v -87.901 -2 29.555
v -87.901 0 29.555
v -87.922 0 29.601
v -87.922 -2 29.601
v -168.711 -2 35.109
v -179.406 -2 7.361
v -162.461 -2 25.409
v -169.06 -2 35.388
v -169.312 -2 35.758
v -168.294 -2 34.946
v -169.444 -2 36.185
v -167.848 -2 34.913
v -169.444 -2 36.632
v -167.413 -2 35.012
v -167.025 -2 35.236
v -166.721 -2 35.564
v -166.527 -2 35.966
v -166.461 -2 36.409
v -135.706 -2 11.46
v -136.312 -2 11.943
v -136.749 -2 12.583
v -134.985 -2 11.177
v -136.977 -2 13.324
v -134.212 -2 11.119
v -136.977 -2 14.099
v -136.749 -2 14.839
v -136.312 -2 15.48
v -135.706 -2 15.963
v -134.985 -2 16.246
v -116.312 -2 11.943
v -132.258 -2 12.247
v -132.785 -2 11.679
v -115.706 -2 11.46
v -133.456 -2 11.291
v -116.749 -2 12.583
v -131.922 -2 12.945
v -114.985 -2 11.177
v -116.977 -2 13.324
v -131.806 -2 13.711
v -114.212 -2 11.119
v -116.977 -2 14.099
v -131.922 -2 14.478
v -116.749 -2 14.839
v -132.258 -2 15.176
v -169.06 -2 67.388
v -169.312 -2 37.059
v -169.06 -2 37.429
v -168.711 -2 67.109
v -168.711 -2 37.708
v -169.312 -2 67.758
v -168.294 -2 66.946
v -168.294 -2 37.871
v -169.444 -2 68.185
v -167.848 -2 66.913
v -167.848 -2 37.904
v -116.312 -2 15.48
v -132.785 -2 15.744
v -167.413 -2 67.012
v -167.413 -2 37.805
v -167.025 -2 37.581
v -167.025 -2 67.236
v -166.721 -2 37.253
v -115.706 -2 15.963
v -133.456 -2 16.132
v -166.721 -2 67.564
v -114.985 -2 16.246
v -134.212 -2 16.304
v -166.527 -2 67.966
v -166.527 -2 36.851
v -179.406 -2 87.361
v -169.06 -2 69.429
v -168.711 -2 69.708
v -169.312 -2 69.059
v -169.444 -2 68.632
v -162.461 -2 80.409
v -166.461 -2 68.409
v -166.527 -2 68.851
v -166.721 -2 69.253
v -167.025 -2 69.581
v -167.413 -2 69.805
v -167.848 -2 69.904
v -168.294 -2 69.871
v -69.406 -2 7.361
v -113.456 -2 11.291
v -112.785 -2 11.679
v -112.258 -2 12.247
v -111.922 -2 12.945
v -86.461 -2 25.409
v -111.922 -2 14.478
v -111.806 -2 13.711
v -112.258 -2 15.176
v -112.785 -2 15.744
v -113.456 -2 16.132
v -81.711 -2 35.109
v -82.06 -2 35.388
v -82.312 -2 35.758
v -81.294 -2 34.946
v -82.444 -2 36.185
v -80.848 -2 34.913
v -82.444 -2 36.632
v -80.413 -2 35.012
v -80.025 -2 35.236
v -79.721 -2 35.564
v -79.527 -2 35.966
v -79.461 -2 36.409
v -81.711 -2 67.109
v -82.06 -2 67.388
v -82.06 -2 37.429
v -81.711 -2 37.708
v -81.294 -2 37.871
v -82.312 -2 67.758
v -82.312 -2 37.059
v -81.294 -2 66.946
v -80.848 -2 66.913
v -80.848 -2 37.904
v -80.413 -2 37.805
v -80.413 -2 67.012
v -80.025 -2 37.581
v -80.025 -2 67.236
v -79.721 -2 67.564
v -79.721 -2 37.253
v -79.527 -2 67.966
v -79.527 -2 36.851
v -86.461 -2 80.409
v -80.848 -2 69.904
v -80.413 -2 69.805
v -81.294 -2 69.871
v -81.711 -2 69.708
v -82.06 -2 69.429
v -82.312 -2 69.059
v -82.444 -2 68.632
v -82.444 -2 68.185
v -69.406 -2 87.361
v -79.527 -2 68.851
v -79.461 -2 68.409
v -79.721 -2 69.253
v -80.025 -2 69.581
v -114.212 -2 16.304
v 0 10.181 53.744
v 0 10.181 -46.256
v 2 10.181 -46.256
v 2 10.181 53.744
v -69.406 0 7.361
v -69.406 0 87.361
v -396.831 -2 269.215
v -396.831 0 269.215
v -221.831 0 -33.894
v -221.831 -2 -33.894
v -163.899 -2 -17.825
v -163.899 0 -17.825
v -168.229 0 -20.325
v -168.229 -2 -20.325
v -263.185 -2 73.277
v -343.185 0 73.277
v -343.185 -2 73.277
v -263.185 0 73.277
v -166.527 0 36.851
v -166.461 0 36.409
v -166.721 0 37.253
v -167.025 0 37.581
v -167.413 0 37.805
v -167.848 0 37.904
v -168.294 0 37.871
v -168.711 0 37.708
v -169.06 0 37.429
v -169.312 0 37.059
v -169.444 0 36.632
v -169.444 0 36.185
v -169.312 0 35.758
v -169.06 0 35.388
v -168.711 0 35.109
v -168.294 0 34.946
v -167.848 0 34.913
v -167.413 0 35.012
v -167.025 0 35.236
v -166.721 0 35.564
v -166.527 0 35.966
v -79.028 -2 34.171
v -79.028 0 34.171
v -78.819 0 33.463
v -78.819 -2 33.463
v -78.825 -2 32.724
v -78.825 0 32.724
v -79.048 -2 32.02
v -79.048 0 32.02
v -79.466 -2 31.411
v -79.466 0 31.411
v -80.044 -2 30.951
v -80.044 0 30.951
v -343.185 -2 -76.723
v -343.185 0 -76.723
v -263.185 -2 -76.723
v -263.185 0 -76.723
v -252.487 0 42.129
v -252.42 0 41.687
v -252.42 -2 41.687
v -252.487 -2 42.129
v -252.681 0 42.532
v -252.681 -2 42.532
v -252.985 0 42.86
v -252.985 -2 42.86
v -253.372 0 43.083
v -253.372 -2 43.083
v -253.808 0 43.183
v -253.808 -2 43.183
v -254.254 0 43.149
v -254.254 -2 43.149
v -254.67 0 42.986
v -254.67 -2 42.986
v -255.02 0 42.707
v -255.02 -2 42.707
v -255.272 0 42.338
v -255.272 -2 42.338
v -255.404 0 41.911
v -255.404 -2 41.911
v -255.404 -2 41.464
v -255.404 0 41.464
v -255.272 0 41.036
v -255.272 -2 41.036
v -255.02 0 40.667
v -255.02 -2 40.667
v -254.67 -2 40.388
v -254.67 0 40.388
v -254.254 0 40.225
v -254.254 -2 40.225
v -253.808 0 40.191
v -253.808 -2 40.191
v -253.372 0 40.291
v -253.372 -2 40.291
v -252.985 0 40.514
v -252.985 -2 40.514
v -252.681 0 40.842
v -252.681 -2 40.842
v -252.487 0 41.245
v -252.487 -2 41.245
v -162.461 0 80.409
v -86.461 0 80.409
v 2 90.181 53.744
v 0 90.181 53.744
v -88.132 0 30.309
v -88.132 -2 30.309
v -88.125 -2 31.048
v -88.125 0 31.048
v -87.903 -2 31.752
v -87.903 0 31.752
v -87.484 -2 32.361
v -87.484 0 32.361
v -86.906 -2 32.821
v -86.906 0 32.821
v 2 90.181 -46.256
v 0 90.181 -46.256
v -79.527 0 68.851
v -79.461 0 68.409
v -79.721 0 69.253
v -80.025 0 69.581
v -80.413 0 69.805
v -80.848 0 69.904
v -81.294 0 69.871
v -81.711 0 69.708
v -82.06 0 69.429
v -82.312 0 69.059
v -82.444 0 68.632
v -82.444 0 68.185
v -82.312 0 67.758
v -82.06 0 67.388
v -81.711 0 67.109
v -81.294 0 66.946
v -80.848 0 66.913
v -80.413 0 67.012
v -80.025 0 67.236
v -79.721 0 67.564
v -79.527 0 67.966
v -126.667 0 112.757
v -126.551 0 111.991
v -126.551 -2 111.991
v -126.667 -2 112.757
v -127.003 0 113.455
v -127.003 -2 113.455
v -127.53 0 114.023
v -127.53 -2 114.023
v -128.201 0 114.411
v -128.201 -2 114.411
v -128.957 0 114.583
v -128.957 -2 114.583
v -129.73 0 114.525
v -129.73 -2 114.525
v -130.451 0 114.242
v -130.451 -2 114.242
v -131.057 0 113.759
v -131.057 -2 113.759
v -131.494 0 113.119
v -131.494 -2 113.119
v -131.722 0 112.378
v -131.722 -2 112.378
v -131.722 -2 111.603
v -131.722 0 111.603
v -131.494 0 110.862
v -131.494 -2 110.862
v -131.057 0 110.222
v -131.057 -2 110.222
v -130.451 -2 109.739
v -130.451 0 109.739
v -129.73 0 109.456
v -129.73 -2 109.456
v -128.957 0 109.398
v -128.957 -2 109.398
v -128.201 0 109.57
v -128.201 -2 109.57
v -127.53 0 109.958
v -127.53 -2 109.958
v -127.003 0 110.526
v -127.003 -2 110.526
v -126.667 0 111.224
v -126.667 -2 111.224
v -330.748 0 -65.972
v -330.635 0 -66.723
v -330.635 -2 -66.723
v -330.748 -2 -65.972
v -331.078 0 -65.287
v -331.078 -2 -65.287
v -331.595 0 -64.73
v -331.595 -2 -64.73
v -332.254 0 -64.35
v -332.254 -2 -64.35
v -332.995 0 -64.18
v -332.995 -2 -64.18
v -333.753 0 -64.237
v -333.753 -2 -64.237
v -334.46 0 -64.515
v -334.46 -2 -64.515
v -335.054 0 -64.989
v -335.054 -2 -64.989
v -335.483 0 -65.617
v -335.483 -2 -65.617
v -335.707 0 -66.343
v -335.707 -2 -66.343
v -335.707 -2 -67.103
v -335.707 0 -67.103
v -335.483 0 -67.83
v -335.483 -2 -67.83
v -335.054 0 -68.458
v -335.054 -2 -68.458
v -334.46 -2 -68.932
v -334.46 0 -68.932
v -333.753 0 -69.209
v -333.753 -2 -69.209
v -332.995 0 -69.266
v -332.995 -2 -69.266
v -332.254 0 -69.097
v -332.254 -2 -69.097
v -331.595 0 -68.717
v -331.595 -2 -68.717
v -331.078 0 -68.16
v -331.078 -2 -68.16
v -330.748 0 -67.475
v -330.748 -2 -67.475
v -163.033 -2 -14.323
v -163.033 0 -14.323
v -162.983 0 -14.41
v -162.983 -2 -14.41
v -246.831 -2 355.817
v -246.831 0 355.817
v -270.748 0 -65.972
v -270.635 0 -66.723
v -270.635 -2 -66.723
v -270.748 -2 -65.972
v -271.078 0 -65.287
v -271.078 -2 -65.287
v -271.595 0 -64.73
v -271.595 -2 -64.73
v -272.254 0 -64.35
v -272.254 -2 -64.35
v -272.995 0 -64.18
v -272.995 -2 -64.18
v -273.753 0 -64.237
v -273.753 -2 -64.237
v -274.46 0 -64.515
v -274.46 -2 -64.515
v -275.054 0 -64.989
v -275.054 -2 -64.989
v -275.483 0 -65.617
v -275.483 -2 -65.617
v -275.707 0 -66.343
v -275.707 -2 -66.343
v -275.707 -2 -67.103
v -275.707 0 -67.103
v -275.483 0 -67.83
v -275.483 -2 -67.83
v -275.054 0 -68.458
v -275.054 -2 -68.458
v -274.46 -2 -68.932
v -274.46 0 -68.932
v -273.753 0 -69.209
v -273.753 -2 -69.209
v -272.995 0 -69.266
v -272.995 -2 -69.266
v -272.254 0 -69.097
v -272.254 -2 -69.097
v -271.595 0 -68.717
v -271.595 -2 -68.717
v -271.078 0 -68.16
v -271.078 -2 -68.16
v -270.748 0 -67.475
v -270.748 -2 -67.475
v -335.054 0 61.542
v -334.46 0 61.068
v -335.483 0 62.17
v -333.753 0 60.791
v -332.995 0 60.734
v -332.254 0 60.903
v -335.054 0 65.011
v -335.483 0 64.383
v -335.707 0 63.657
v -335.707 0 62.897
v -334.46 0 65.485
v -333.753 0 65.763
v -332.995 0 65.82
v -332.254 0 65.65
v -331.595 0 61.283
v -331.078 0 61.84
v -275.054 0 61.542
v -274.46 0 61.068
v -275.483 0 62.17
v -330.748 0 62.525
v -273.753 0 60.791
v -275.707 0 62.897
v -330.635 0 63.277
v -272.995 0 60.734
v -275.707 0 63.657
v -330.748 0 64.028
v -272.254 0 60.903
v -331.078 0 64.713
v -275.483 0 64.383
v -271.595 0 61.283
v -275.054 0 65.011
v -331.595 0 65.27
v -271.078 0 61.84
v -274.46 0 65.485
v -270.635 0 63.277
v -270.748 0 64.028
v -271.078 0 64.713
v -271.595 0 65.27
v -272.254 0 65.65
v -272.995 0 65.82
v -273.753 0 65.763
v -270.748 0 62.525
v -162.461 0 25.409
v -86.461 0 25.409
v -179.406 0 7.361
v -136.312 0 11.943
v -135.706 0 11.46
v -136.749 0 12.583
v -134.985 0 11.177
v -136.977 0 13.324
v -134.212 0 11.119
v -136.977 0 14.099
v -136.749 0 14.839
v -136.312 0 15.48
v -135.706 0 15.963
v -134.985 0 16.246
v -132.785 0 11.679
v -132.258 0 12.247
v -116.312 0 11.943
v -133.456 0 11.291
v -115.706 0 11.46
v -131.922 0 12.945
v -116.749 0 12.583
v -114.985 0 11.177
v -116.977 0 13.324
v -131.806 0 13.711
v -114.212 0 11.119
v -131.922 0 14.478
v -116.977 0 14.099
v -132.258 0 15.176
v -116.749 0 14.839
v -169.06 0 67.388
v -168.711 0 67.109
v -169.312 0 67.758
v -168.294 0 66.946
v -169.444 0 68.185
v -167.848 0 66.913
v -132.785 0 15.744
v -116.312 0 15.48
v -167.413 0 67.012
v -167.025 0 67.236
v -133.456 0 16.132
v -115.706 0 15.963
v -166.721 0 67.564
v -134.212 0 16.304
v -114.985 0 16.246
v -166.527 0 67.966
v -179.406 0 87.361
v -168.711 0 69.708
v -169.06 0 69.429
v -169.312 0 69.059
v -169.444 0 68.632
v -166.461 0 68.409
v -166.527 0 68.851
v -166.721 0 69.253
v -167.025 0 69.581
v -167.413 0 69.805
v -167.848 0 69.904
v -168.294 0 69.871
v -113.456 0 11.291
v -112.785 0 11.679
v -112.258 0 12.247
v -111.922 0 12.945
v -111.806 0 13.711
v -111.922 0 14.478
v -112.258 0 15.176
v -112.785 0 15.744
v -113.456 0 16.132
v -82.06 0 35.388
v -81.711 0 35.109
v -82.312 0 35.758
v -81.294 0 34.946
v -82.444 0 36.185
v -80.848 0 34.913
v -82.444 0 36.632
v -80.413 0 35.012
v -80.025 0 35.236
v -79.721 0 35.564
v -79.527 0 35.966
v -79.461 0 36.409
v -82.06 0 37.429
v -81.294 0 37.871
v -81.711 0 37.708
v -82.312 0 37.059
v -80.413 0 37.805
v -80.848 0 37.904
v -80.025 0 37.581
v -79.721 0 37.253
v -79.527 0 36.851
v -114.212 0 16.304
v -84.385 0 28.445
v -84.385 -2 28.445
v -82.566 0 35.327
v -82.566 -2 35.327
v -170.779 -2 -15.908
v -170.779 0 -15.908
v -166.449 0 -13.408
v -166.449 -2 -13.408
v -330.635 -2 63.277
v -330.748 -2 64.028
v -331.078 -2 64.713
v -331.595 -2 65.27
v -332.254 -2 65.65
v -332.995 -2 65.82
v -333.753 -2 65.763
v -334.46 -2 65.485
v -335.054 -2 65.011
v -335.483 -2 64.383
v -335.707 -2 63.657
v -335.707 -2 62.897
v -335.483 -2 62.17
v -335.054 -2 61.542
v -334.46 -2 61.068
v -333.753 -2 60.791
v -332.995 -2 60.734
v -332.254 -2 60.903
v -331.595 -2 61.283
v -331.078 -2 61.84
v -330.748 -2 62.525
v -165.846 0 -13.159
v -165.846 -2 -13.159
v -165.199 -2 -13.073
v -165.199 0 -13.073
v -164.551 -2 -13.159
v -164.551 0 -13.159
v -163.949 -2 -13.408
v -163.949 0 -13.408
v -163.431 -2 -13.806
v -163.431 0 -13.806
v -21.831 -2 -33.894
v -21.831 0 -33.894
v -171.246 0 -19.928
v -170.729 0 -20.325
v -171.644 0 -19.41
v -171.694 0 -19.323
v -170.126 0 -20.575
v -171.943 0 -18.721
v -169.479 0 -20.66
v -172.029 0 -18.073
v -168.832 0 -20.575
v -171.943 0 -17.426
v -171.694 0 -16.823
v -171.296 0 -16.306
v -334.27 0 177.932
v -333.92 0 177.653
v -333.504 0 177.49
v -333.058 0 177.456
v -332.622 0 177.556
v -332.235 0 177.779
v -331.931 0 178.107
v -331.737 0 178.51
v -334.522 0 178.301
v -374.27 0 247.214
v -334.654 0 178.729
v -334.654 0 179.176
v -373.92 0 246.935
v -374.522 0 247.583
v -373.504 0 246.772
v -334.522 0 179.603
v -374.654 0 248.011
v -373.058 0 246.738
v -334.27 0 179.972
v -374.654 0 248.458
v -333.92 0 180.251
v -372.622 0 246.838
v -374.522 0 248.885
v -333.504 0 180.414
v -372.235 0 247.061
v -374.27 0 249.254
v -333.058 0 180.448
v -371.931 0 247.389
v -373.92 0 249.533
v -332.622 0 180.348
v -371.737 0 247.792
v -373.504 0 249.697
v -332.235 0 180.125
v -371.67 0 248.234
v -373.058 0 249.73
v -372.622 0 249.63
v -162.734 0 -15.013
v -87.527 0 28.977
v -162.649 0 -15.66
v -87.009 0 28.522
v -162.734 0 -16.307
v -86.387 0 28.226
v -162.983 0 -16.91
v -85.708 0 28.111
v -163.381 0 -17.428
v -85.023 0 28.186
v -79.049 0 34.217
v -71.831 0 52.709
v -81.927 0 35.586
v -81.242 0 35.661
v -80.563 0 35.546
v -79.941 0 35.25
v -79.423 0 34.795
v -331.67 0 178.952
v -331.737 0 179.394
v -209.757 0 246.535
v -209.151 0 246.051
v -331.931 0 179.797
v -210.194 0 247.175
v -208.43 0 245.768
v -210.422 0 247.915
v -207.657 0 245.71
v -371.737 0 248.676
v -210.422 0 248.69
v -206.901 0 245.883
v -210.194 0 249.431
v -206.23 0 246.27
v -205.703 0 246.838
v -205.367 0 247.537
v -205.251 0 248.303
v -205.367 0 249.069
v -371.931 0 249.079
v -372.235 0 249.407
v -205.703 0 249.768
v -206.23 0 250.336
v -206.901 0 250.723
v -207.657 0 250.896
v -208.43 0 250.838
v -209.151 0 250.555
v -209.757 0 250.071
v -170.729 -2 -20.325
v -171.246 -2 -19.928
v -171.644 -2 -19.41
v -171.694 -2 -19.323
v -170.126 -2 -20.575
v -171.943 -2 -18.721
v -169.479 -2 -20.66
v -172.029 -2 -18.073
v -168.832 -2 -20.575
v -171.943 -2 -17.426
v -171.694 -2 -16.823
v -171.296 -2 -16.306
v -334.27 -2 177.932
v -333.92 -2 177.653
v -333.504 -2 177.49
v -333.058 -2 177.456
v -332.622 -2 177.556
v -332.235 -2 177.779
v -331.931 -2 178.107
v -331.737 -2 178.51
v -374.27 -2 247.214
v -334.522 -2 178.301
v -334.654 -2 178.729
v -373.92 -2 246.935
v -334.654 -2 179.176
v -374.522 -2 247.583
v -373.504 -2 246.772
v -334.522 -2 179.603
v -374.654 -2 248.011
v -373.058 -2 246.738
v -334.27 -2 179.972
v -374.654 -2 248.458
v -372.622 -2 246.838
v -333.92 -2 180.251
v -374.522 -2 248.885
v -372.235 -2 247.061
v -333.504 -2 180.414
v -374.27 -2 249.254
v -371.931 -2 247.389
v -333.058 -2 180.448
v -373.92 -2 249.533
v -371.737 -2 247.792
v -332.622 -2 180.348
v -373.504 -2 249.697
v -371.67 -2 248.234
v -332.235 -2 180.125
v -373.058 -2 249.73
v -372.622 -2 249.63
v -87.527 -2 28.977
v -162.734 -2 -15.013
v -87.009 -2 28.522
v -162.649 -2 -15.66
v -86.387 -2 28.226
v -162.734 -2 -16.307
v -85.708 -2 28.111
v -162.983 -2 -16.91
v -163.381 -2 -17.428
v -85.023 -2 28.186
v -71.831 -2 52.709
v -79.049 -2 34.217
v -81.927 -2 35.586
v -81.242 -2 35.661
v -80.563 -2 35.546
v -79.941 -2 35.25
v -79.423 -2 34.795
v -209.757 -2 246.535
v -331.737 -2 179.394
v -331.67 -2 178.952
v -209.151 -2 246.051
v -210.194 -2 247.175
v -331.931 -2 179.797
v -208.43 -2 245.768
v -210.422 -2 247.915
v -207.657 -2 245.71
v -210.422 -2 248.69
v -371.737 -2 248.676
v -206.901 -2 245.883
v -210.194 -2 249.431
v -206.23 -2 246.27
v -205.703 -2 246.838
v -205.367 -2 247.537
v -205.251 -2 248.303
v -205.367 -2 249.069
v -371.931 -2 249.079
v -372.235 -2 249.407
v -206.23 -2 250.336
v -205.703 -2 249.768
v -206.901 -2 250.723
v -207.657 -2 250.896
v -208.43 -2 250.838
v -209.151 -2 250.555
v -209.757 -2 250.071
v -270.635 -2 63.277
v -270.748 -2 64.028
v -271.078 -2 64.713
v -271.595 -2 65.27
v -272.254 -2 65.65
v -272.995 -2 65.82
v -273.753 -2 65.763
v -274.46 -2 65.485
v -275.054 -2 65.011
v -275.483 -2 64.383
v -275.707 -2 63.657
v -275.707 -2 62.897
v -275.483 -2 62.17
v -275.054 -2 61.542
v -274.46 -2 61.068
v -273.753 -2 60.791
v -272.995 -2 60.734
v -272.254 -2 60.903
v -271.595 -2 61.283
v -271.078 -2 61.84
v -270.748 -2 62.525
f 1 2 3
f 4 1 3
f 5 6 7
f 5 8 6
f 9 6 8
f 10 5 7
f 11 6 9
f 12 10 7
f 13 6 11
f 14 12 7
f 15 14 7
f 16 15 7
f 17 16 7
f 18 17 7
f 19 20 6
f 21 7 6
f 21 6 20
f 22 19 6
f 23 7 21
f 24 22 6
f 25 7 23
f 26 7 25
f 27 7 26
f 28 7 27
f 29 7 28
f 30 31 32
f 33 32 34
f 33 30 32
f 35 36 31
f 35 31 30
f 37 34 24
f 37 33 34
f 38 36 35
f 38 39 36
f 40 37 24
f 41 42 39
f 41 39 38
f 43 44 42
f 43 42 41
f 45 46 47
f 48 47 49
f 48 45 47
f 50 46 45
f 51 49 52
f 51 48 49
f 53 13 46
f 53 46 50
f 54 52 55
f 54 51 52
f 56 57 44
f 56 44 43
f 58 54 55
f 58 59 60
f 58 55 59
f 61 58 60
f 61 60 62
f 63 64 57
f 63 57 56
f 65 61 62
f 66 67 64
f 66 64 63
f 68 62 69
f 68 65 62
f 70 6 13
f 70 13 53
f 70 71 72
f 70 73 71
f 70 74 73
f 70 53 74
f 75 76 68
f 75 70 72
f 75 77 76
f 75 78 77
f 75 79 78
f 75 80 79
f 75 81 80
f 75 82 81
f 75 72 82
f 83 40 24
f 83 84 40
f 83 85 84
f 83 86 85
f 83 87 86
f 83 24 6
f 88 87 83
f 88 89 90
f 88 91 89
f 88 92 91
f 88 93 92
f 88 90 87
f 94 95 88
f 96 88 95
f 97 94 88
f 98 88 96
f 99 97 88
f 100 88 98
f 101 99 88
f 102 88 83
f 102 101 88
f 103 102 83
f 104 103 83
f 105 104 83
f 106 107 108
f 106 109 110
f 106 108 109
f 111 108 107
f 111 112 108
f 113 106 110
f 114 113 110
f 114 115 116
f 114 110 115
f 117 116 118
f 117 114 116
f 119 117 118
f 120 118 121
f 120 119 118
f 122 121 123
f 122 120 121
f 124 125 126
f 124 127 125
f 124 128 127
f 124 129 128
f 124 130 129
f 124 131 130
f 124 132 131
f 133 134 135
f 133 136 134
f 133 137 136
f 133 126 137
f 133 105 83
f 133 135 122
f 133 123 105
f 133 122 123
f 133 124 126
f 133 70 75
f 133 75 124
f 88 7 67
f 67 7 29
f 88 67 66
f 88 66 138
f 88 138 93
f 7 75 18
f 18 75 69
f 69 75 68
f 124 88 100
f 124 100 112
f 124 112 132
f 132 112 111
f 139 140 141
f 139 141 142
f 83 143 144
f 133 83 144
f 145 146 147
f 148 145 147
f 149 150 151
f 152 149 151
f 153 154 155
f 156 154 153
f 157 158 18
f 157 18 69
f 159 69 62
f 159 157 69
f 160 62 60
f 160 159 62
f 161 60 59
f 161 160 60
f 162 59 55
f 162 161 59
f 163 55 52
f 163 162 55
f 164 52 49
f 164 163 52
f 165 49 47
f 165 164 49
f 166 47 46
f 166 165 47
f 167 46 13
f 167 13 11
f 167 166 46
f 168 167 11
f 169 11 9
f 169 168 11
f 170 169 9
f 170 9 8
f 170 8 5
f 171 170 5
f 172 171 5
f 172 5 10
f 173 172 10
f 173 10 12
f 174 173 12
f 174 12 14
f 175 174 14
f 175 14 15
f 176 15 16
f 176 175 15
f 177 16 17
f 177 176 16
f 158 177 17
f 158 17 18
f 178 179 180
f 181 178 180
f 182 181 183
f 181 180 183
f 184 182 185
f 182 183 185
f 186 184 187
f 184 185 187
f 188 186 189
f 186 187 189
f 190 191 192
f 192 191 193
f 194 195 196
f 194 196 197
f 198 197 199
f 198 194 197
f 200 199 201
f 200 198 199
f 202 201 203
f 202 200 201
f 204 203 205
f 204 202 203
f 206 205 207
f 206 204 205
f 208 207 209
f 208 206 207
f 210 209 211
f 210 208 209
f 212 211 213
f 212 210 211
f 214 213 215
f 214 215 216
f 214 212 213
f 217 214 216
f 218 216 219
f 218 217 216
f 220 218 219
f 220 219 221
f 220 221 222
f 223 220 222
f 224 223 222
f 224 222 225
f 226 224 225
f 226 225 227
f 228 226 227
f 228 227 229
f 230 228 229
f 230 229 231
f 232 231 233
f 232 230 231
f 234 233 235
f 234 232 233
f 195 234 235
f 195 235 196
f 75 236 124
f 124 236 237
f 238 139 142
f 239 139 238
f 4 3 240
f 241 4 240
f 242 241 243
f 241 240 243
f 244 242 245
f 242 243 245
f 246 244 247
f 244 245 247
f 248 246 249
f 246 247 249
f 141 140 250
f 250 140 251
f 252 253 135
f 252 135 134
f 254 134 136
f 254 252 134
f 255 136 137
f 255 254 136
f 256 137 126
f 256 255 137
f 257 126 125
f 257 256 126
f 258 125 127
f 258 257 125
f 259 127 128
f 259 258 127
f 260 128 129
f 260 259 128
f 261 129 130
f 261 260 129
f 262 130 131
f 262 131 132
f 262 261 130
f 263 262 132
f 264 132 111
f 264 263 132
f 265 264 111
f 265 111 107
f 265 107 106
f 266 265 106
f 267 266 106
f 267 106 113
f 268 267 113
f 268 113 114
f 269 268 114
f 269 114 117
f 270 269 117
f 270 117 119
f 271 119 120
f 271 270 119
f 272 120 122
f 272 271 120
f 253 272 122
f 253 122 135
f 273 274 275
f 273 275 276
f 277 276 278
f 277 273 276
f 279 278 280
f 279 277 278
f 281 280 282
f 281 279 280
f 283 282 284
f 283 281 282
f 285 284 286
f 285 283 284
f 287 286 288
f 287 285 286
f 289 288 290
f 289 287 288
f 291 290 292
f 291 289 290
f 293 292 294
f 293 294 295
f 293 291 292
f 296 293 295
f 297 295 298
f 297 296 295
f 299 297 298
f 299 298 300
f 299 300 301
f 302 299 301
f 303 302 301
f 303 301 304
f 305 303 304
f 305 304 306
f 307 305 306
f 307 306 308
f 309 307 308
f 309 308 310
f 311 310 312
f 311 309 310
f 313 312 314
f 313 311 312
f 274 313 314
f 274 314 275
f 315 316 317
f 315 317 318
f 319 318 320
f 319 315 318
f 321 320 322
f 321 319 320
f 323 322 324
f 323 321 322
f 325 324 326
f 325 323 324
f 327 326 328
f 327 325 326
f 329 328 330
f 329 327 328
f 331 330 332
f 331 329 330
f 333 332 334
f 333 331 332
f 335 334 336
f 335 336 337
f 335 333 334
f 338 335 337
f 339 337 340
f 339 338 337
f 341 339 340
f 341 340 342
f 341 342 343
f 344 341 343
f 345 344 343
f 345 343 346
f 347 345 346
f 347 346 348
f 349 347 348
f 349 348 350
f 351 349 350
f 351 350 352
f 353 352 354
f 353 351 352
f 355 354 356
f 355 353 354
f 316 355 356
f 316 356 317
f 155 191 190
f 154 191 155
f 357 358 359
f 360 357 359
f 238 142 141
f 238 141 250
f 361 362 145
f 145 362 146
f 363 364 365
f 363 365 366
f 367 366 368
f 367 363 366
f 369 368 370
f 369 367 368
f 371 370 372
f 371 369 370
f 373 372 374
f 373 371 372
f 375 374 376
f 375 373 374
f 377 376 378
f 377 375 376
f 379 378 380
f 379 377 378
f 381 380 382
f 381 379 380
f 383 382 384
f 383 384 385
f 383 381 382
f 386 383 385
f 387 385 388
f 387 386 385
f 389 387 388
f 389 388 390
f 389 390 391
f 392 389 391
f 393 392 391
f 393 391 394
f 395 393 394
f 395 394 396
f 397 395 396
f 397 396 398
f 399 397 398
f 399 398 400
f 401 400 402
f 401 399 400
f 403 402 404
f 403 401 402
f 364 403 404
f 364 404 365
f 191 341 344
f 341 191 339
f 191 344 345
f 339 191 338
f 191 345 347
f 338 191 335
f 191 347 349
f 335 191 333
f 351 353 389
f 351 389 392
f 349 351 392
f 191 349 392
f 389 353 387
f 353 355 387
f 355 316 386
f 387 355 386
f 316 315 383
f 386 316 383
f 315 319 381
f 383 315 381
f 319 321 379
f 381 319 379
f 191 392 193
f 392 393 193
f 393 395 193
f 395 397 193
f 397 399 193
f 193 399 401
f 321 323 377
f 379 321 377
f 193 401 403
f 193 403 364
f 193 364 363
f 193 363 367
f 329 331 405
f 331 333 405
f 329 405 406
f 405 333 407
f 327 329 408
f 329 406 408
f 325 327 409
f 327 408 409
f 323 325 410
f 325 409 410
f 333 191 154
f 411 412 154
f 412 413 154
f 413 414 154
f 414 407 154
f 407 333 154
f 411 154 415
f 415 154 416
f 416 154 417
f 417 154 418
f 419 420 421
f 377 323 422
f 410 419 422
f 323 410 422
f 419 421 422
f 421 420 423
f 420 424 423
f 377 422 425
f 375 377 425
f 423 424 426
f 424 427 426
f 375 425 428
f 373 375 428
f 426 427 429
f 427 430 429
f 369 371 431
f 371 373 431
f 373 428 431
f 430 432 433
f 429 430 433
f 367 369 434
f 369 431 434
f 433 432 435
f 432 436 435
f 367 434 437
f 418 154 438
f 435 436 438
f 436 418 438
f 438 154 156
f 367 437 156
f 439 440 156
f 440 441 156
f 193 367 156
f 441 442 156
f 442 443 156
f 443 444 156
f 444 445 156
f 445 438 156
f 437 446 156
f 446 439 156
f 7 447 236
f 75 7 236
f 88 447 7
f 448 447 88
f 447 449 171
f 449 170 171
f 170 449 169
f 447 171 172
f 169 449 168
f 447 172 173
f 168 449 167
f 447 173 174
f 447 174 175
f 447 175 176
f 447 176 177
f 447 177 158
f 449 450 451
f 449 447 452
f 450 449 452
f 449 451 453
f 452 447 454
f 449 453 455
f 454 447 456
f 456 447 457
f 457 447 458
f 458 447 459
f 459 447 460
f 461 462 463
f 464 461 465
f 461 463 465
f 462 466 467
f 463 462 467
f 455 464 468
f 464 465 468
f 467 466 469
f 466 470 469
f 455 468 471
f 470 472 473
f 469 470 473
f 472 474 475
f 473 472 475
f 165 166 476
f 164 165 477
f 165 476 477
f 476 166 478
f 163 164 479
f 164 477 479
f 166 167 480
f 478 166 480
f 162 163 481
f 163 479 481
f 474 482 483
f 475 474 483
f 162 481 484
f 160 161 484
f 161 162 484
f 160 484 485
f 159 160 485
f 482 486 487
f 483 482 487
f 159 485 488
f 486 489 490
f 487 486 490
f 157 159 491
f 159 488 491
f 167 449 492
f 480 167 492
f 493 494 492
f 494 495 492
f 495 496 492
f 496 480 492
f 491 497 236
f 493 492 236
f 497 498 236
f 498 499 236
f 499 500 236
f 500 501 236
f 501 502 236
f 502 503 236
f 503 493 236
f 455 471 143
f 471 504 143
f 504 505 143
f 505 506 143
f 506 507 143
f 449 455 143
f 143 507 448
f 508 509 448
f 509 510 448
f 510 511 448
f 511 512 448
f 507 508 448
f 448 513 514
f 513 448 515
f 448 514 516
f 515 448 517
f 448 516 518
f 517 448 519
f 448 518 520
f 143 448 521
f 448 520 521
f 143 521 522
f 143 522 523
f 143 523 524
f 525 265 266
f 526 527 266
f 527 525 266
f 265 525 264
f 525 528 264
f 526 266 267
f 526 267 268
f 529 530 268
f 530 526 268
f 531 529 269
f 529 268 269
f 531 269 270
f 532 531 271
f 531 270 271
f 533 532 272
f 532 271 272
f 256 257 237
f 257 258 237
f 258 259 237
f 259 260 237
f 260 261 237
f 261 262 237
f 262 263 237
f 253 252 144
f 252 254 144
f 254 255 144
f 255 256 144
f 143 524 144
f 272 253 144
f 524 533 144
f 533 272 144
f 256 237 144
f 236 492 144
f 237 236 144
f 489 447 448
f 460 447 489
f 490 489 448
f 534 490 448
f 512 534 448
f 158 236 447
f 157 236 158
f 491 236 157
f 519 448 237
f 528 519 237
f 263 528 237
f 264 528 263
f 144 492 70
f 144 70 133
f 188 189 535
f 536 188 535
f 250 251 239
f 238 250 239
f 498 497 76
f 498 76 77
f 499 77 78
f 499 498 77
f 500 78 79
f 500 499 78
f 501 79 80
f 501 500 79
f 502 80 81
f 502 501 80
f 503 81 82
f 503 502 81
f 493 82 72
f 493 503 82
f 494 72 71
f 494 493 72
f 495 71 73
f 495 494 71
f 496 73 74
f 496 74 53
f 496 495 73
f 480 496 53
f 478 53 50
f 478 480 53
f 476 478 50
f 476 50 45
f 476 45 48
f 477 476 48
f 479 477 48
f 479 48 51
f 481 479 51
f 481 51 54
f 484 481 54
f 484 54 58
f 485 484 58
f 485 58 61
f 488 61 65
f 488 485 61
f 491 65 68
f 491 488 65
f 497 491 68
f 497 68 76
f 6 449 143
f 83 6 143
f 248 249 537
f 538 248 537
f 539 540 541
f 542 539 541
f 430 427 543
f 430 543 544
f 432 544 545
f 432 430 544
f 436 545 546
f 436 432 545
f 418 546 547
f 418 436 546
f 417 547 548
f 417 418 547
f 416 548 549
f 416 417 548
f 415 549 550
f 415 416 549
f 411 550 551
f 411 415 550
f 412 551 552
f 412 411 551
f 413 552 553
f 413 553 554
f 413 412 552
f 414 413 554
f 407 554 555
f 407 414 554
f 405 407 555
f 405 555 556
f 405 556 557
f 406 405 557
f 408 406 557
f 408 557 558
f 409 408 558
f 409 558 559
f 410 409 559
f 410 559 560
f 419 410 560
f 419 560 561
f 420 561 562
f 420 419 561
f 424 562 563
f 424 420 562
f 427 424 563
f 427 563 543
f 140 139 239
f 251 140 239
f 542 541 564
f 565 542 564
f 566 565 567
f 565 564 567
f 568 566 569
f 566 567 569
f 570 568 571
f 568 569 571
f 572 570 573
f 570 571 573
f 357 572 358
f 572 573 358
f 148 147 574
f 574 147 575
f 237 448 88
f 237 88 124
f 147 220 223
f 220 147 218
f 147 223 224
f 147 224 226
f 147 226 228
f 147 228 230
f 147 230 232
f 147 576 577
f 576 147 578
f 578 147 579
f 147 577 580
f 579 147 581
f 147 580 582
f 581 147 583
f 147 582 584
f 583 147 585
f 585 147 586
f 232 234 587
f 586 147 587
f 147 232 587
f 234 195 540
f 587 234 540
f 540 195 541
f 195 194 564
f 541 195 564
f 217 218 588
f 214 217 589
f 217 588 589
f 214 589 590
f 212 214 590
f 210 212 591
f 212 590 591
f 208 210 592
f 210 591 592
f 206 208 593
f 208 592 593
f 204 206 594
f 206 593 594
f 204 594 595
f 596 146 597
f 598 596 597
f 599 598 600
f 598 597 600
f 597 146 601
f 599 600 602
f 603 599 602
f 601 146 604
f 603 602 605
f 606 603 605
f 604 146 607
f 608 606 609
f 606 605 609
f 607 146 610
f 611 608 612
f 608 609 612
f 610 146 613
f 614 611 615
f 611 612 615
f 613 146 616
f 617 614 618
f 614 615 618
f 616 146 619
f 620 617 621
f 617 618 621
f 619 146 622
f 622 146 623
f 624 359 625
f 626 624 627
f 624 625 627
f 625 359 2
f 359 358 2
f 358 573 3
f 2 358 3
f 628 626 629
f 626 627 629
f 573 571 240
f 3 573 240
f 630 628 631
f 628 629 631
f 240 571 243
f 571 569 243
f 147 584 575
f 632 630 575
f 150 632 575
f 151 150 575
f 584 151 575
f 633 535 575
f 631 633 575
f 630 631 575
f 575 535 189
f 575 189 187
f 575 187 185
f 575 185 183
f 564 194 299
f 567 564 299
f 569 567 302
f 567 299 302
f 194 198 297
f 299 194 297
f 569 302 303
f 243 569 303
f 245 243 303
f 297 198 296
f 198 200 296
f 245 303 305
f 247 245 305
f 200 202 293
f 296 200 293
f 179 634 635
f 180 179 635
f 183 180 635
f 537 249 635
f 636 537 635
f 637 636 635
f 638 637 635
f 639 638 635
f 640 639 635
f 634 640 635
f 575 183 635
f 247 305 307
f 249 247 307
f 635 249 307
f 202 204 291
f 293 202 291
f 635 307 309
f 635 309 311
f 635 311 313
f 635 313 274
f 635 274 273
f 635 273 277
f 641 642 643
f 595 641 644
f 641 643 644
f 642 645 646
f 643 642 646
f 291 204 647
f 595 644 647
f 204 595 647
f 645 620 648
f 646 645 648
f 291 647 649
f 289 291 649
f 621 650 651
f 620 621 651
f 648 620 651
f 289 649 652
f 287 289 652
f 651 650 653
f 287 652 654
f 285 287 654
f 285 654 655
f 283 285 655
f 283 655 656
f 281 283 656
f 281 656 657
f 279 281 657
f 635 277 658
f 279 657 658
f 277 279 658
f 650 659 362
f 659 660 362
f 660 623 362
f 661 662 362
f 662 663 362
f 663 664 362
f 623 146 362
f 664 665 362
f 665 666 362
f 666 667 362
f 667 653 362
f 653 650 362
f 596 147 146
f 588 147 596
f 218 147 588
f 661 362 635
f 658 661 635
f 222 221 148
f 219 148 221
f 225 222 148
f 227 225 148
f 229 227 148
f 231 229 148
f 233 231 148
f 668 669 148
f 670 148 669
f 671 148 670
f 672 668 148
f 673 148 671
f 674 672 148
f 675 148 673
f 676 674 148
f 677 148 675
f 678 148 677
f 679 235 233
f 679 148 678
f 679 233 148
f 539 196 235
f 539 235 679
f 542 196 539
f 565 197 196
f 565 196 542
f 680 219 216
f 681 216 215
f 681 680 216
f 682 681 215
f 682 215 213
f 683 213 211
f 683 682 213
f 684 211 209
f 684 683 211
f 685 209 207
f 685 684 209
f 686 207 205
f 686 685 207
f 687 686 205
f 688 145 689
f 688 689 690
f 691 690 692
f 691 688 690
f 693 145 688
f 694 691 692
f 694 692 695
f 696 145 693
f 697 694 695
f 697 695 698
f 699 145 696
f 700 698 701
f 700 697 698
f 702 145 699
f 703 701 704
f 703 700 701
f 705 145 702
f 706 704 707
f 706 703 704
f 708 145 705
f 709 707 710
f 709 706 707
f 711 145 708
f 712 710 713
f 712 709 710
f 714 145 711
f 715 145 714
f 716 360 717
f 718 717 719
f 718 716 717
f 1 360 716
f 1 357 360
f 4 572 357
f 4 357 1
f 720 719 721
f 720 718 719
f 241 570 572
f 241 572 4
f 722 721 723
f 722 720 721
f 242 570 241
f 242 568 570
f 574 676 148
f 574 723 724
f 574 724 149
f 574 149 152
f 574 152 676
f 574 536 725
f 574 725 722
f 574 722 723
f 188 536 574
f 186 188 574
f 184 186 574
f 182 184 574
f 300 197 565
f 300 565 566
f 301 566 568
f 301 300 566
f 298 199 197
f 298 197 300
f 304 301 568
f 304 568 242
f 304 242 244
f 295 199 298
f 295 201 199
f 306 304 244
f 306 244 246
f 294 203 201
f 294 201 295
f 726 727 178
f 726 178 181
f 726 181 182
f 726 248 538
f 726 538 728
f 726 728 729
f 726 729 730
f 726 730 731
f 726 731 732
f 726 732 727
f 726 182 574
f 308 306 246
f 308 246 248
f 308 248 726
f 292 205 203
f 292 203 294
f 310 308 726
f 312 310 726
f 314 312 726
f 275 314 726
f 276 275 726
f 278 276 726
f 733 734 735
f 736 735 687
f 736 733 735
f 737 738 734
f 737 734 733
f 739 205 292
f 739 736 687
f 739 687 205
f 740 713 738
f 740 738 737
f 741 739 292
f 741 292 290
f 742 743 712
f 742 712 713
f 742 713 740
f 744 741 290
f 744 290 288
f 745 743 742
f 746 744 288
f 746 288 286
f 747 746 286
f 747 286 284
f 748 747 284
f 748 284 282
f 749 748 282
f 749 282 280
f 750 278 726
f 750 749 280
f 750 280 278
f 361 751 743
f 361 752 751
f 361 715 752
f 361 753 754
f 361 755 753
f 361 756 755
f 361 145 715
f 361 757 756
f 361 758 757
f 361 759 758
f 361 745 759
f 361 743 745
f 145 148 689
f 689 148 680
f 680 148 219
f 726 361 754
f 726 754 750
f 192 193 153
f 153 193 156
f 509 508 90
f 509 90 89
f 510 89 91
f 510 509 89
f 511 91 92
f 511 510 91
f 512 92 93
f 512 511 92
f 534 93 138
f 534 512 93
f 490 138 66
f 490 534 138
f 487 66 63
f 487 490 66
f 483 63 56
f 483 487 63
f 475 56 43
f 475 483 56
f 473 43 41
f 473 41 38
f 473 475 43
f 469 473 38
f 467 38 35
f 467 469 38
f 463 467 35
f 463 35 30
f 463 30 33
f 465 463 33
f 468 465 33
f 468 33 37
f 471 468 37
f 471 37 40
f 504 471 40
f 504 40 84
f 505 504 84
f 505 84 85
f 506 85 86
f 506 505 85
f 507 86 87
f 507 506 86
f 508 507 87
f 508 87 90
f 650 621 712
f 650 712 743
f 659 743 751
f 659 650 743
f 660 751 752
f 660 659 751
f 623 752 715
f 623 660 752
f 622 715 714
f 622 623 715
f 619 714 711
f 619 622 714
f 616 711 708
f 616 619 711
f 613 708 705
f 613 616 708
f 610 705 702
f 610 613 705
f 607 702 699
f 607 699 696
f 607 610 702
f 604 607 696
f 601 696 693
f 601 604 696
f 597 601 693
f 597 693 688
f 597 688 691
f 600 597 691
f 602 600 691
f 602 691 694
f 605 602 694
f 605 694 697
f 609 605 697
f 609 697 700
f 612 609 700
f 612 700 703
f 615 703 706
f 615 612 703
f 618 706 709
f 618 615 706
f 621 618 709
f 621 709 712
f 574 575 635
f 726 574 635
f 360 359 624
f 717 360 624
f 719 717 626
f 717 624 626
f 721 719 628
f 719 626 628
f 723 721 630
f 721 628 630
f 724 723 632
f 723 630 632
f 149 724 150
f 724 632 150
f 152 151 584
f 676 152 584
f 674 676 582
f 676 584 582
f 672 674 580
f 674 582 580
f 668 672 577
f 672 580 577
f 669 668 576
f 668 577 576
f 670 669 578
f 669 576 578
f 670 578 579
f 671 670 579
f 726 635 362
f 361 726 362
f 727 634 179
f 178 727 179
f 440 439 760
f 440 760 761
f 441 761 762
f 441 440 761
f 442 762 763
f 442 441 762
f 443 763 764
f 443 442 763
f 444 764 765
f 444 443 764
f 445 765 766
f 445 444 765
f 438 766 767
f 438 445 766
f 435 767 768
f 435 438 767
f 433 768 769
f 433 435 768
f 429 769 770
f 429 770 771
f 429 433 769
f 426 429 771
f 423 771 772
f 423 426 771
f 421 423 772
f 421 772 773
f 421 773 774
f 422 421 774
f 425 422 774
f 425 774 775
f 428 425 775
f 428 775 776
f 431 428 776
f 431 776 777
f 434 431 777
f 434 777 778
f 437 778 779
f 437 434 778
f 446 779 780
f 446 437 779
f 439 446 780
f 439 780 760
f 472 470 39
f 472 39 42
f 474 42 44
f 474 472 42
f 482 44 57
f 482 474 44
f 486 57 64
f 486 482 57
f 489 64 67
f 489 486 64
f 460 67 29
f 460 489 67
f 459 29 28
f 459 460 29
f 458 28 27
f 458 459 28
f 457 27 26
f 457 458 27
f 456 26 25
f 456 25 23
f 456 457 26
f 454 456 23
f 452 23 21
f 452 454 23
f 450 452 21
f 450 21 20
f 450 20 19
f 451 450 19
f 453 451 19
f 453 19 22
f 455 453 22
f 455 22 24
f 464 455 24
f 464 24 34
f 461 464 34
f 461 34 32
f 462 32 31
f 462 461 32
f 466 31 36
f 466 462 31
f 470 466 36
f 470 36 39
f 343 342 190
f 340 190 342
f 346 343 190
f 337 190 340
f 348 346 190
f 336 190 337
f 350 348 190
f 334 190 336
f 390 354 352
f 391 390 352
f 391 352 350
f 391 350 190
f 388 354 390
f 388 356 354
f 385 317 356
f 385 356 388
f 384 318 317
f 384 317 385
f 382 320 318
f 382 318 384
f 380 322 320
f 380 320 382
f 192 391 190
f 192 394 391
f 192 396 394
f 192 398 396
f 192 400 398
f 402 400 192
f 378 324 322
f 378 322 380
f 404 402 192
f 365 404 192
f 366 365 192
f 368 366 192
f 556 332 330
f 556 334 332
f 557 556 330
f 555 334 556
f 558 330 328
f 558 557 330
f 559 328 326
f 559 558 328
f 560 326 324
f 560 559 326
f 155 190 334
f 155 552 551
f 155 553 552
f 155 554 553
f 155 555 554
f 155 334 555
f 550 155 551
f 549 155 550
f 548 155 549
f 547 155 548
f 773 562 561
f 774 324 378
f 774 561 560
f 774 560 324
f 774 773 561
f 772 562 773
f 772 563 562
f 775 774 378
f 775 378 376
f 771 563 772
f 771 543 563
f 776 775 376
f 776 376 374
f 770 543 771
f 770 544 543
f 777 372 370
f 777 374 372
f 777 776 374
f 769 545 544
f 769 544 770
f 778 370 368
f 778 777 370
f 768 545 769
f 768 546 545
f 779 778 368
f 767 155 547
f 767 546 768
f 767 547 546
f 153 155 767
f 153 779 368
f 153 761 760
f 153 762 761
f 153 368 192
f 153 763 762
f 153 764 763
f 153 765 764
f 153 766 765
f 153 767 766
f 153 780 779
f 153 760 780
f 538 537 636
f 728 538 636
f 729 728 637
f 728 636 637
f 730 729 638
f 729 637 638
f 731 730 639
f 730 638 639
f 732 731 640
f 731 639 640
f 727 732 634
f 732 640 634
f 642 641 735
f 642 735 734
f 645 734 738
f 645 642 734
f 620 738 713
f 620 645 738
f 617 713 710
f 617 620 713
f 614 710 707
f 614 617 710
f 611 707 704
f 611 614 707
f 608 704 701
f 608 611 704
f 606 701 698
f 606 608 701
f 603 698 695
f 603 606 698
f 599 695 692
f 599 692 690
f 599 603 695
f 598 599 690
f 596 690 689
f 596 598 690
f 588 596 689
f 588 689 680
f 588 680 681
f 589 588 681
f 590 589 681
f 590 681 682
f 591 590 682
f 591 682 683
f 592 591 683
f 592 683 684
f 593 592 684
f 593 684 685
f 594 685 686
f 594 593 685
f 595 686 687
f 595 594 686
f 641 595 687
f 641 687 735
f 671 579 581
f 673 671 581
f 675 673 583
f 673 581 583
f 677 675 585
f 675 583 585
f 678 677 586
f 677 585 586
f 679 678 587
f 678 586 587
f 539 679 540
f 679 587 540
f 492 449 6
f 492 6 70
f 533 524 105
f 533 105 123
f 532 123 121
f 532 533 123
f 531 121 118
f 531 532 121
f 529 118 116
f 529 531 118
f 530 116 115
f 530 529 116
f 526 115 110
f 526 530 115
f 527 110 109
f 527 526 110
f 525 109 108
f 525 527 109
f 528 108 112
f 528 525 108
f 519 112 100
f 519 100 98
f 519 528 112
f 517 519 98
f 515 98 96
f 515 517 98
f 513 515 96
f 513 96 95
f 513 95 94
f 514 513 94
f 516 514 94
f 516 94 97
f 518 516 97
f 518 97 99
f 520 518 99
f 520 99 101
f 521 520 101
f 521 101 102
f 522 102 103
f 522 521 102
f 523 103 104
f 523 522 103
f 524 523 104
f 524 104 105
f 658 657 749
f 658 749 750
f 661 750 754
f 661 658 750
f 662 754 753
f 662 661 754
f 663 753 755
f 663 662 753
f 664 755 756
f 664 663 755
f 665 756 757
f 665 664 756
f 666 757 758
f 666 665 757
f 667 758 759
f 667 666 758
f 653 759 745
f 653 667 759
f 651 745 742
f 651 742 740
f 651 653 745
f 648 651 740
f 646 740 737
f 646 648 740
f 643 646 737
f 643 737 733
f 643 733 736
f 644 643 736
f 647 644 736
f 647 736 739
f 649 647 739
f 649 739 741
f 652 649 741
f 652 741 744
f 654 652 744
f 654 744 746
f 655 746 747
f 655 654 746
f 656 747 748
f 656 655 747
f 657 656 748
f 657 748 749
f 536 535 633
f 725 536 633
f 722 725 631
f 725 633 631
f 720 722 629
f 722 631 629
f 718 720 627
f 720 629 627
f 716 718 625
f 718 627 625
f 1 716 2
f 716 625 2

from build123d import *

# Parameters (mm, degrees)
F0_R     = 1.5
F0_R_2   = 2.6
F1_DEPTH = 2
F2_W     = 80
F2_H     = 100
F3_DEPTH = 2
F4_W     = 110
F4_H     = 80
F4_R     = 2.6
F4_R_2   = 1.5
F4_W_2   = 76
F4_H_2   = 55
F5_DEPTH = 2
F6_W     = 80
F6_H     = 150
F6_R     = 2.55
F7_DEPTH = 2


with BuildPart() as f1:
    # F0 (on Front) → F1 (new body)
    with BuildSketch(Plane.XZ):
        Polygon((-396.830598, 269.2149), (-221.830598, -33.893992), (-21.830598, -33.893992), (-71.830598, 52.708549), (-246.830598, 355.81744), align=None)
        with Locations((-253.920344, 41.687079)):
            Circle(F0_R, mode=Mode.SUBTRACT)
        with BuildLine():
            ThreePointArc((-162.983456, -14.41007), (-162.733705, -16.307118), (-163.89852, -17.825134))
            Line((-163.89852, -17.825134), (-168.228647, -20.325134))
            ThreePointArc((-168.228647, -20.325134), (-170.125695, -20.574885), (-171.64371, -19.41007))
            Line((-171.64371, -19.41007), (-171.69371, -19.323468))
            ThreePointArc((-171.69371, -19.323468), (-171.943461, -17.42642), (-170.778647, -15.908404))
            Line((-170.778647, -15.908404), (-166.44852, -13.408404))
            ThreePointArc((-166.44852, -13.408404), (-164.551472, -13.158653), (-163.033456, -14.323468))
            Line((-163.033456, -14.323468), (-162.983456, -14.41007))
        make_face(mode=Mode.SUBTRACT)
        with BuildLine():
            ThreePointArc((-79.027981, 34.171403), (-78.910289, 32.363716), (-80.044363, 30.951109))
            Line((-80.044363, 30.951109), (-84.384654, 28.445241))
            ThreePointArc((-84.384654, 28.445241), (-86.38711, 28.226231), (-87.901036, 29.555075))
            Line((-87.901036, 29.555075), (-87.922211, 29.600553))
            ThreePointArc((-87.922211, 29.600553), (-88.039903, 31.40824), (-86.905829, 32.820847))
            Line((-86.905829, 32.820847), (-82.565538, 35.326715))
            ThreePointArc((-82.565538, 35.326715), (-80.563082, 35.545725), (-79.049156, 34.216881))
            Line((-79.049156, 34.216881), (-79.027981, 34.171403))
        make_face(mode=Mode.SUBTRACT)
        with Locations((-129.151107, 111.990581)):
            Circle(F0_R_2, mode=Mode.SUBTRACT)
        with Locations((-333.170344, 178.952105)):
            Circle(F0_R, mode=Mode.SUBTRACT)
        with Locations((-373.170344, 248.234137)):
            Circle(F0_R, mode=Mode.SUBTRACT)
        with Locations((-207.851107, 248.302979)):
            Circle(F0_R_2, mode=Mode.SUBTRACT)
    extrude(amount=F1_DEPTH)


with BuildPart() as f3:
    # F2 (on Right) → F3 (new body)
    with BuildSketch(Plane.YZ):
        with Locations((50.180683, 3.744156)):
            Rectangle(F2_W, F2_H)
    extrude(amount=F3_DEPTH)


with BuildPart() as f5:
    # F4 (on Front) → F5 (new body)
    with BuildSketch(Plane.XZ):
        with Locations((-124.406036, 47.36132)):
            Rectangle(F4_W, F4_H)
        with Locations((-134.406036, 13.71132)):
            Circle(F4_R, mode=Mode.SUBTRACT)
        with Locations((-167.960587, 36.408519)):
            Circle(F4_R_2, mode=Mode.SUBTRACT)
        with Locations((-114.406036, 13.71132)):
            Circle(F4_R, mode=Mode.SUBTRACT)
        with Locations((-80.960587, 36.408519)):
            Circle(F4_R_2, mode=Mode.SUBTRACT)
        with Locations((-124.460587, 52.908519)):
            Rectangle(F4_W_2, F4_H_2, mode=Mode.SUBTRACT)
        with Locations((-167.960587, 68.408519)):
            Circle(F4_R_2, mode=Mode.SUBTRACT)
        with Locations((-80.960587, 68.408519)):
            Circle(F4_R_2, mode=Mode.SUBTRACT)
    extrude(amount=F5_DEPTH)


with BuildPart() as f7:
    # F6 (on Front) → F7 (new body)
    with BuildSketch(Plane.XZ):
        with Locations((-303.185135, -1.723323)):
            Rectangle(F6_W, F6_H)
        with Locations((-333.185135, -66.723323)):
            Circle(F6_R, mode=Mode.SUBTRACT)
        with Locations((-273.185135, -66.723323)):
            Circle(F6_R, mode=Mode.SUBTRACT)
        with Locations((-333.185135, 63.276677)):
            Circle(F6_R, mode=Mode.SUBTRACT)
        with Locations((-273.185135, 63.276677)):
            Circle(F6_R, mode=Mode.SUBTRACT)
    extrude(amount=F7_DEPTH)


solid = Compound([f1.part, f3.part, f5.part, f7.part])
